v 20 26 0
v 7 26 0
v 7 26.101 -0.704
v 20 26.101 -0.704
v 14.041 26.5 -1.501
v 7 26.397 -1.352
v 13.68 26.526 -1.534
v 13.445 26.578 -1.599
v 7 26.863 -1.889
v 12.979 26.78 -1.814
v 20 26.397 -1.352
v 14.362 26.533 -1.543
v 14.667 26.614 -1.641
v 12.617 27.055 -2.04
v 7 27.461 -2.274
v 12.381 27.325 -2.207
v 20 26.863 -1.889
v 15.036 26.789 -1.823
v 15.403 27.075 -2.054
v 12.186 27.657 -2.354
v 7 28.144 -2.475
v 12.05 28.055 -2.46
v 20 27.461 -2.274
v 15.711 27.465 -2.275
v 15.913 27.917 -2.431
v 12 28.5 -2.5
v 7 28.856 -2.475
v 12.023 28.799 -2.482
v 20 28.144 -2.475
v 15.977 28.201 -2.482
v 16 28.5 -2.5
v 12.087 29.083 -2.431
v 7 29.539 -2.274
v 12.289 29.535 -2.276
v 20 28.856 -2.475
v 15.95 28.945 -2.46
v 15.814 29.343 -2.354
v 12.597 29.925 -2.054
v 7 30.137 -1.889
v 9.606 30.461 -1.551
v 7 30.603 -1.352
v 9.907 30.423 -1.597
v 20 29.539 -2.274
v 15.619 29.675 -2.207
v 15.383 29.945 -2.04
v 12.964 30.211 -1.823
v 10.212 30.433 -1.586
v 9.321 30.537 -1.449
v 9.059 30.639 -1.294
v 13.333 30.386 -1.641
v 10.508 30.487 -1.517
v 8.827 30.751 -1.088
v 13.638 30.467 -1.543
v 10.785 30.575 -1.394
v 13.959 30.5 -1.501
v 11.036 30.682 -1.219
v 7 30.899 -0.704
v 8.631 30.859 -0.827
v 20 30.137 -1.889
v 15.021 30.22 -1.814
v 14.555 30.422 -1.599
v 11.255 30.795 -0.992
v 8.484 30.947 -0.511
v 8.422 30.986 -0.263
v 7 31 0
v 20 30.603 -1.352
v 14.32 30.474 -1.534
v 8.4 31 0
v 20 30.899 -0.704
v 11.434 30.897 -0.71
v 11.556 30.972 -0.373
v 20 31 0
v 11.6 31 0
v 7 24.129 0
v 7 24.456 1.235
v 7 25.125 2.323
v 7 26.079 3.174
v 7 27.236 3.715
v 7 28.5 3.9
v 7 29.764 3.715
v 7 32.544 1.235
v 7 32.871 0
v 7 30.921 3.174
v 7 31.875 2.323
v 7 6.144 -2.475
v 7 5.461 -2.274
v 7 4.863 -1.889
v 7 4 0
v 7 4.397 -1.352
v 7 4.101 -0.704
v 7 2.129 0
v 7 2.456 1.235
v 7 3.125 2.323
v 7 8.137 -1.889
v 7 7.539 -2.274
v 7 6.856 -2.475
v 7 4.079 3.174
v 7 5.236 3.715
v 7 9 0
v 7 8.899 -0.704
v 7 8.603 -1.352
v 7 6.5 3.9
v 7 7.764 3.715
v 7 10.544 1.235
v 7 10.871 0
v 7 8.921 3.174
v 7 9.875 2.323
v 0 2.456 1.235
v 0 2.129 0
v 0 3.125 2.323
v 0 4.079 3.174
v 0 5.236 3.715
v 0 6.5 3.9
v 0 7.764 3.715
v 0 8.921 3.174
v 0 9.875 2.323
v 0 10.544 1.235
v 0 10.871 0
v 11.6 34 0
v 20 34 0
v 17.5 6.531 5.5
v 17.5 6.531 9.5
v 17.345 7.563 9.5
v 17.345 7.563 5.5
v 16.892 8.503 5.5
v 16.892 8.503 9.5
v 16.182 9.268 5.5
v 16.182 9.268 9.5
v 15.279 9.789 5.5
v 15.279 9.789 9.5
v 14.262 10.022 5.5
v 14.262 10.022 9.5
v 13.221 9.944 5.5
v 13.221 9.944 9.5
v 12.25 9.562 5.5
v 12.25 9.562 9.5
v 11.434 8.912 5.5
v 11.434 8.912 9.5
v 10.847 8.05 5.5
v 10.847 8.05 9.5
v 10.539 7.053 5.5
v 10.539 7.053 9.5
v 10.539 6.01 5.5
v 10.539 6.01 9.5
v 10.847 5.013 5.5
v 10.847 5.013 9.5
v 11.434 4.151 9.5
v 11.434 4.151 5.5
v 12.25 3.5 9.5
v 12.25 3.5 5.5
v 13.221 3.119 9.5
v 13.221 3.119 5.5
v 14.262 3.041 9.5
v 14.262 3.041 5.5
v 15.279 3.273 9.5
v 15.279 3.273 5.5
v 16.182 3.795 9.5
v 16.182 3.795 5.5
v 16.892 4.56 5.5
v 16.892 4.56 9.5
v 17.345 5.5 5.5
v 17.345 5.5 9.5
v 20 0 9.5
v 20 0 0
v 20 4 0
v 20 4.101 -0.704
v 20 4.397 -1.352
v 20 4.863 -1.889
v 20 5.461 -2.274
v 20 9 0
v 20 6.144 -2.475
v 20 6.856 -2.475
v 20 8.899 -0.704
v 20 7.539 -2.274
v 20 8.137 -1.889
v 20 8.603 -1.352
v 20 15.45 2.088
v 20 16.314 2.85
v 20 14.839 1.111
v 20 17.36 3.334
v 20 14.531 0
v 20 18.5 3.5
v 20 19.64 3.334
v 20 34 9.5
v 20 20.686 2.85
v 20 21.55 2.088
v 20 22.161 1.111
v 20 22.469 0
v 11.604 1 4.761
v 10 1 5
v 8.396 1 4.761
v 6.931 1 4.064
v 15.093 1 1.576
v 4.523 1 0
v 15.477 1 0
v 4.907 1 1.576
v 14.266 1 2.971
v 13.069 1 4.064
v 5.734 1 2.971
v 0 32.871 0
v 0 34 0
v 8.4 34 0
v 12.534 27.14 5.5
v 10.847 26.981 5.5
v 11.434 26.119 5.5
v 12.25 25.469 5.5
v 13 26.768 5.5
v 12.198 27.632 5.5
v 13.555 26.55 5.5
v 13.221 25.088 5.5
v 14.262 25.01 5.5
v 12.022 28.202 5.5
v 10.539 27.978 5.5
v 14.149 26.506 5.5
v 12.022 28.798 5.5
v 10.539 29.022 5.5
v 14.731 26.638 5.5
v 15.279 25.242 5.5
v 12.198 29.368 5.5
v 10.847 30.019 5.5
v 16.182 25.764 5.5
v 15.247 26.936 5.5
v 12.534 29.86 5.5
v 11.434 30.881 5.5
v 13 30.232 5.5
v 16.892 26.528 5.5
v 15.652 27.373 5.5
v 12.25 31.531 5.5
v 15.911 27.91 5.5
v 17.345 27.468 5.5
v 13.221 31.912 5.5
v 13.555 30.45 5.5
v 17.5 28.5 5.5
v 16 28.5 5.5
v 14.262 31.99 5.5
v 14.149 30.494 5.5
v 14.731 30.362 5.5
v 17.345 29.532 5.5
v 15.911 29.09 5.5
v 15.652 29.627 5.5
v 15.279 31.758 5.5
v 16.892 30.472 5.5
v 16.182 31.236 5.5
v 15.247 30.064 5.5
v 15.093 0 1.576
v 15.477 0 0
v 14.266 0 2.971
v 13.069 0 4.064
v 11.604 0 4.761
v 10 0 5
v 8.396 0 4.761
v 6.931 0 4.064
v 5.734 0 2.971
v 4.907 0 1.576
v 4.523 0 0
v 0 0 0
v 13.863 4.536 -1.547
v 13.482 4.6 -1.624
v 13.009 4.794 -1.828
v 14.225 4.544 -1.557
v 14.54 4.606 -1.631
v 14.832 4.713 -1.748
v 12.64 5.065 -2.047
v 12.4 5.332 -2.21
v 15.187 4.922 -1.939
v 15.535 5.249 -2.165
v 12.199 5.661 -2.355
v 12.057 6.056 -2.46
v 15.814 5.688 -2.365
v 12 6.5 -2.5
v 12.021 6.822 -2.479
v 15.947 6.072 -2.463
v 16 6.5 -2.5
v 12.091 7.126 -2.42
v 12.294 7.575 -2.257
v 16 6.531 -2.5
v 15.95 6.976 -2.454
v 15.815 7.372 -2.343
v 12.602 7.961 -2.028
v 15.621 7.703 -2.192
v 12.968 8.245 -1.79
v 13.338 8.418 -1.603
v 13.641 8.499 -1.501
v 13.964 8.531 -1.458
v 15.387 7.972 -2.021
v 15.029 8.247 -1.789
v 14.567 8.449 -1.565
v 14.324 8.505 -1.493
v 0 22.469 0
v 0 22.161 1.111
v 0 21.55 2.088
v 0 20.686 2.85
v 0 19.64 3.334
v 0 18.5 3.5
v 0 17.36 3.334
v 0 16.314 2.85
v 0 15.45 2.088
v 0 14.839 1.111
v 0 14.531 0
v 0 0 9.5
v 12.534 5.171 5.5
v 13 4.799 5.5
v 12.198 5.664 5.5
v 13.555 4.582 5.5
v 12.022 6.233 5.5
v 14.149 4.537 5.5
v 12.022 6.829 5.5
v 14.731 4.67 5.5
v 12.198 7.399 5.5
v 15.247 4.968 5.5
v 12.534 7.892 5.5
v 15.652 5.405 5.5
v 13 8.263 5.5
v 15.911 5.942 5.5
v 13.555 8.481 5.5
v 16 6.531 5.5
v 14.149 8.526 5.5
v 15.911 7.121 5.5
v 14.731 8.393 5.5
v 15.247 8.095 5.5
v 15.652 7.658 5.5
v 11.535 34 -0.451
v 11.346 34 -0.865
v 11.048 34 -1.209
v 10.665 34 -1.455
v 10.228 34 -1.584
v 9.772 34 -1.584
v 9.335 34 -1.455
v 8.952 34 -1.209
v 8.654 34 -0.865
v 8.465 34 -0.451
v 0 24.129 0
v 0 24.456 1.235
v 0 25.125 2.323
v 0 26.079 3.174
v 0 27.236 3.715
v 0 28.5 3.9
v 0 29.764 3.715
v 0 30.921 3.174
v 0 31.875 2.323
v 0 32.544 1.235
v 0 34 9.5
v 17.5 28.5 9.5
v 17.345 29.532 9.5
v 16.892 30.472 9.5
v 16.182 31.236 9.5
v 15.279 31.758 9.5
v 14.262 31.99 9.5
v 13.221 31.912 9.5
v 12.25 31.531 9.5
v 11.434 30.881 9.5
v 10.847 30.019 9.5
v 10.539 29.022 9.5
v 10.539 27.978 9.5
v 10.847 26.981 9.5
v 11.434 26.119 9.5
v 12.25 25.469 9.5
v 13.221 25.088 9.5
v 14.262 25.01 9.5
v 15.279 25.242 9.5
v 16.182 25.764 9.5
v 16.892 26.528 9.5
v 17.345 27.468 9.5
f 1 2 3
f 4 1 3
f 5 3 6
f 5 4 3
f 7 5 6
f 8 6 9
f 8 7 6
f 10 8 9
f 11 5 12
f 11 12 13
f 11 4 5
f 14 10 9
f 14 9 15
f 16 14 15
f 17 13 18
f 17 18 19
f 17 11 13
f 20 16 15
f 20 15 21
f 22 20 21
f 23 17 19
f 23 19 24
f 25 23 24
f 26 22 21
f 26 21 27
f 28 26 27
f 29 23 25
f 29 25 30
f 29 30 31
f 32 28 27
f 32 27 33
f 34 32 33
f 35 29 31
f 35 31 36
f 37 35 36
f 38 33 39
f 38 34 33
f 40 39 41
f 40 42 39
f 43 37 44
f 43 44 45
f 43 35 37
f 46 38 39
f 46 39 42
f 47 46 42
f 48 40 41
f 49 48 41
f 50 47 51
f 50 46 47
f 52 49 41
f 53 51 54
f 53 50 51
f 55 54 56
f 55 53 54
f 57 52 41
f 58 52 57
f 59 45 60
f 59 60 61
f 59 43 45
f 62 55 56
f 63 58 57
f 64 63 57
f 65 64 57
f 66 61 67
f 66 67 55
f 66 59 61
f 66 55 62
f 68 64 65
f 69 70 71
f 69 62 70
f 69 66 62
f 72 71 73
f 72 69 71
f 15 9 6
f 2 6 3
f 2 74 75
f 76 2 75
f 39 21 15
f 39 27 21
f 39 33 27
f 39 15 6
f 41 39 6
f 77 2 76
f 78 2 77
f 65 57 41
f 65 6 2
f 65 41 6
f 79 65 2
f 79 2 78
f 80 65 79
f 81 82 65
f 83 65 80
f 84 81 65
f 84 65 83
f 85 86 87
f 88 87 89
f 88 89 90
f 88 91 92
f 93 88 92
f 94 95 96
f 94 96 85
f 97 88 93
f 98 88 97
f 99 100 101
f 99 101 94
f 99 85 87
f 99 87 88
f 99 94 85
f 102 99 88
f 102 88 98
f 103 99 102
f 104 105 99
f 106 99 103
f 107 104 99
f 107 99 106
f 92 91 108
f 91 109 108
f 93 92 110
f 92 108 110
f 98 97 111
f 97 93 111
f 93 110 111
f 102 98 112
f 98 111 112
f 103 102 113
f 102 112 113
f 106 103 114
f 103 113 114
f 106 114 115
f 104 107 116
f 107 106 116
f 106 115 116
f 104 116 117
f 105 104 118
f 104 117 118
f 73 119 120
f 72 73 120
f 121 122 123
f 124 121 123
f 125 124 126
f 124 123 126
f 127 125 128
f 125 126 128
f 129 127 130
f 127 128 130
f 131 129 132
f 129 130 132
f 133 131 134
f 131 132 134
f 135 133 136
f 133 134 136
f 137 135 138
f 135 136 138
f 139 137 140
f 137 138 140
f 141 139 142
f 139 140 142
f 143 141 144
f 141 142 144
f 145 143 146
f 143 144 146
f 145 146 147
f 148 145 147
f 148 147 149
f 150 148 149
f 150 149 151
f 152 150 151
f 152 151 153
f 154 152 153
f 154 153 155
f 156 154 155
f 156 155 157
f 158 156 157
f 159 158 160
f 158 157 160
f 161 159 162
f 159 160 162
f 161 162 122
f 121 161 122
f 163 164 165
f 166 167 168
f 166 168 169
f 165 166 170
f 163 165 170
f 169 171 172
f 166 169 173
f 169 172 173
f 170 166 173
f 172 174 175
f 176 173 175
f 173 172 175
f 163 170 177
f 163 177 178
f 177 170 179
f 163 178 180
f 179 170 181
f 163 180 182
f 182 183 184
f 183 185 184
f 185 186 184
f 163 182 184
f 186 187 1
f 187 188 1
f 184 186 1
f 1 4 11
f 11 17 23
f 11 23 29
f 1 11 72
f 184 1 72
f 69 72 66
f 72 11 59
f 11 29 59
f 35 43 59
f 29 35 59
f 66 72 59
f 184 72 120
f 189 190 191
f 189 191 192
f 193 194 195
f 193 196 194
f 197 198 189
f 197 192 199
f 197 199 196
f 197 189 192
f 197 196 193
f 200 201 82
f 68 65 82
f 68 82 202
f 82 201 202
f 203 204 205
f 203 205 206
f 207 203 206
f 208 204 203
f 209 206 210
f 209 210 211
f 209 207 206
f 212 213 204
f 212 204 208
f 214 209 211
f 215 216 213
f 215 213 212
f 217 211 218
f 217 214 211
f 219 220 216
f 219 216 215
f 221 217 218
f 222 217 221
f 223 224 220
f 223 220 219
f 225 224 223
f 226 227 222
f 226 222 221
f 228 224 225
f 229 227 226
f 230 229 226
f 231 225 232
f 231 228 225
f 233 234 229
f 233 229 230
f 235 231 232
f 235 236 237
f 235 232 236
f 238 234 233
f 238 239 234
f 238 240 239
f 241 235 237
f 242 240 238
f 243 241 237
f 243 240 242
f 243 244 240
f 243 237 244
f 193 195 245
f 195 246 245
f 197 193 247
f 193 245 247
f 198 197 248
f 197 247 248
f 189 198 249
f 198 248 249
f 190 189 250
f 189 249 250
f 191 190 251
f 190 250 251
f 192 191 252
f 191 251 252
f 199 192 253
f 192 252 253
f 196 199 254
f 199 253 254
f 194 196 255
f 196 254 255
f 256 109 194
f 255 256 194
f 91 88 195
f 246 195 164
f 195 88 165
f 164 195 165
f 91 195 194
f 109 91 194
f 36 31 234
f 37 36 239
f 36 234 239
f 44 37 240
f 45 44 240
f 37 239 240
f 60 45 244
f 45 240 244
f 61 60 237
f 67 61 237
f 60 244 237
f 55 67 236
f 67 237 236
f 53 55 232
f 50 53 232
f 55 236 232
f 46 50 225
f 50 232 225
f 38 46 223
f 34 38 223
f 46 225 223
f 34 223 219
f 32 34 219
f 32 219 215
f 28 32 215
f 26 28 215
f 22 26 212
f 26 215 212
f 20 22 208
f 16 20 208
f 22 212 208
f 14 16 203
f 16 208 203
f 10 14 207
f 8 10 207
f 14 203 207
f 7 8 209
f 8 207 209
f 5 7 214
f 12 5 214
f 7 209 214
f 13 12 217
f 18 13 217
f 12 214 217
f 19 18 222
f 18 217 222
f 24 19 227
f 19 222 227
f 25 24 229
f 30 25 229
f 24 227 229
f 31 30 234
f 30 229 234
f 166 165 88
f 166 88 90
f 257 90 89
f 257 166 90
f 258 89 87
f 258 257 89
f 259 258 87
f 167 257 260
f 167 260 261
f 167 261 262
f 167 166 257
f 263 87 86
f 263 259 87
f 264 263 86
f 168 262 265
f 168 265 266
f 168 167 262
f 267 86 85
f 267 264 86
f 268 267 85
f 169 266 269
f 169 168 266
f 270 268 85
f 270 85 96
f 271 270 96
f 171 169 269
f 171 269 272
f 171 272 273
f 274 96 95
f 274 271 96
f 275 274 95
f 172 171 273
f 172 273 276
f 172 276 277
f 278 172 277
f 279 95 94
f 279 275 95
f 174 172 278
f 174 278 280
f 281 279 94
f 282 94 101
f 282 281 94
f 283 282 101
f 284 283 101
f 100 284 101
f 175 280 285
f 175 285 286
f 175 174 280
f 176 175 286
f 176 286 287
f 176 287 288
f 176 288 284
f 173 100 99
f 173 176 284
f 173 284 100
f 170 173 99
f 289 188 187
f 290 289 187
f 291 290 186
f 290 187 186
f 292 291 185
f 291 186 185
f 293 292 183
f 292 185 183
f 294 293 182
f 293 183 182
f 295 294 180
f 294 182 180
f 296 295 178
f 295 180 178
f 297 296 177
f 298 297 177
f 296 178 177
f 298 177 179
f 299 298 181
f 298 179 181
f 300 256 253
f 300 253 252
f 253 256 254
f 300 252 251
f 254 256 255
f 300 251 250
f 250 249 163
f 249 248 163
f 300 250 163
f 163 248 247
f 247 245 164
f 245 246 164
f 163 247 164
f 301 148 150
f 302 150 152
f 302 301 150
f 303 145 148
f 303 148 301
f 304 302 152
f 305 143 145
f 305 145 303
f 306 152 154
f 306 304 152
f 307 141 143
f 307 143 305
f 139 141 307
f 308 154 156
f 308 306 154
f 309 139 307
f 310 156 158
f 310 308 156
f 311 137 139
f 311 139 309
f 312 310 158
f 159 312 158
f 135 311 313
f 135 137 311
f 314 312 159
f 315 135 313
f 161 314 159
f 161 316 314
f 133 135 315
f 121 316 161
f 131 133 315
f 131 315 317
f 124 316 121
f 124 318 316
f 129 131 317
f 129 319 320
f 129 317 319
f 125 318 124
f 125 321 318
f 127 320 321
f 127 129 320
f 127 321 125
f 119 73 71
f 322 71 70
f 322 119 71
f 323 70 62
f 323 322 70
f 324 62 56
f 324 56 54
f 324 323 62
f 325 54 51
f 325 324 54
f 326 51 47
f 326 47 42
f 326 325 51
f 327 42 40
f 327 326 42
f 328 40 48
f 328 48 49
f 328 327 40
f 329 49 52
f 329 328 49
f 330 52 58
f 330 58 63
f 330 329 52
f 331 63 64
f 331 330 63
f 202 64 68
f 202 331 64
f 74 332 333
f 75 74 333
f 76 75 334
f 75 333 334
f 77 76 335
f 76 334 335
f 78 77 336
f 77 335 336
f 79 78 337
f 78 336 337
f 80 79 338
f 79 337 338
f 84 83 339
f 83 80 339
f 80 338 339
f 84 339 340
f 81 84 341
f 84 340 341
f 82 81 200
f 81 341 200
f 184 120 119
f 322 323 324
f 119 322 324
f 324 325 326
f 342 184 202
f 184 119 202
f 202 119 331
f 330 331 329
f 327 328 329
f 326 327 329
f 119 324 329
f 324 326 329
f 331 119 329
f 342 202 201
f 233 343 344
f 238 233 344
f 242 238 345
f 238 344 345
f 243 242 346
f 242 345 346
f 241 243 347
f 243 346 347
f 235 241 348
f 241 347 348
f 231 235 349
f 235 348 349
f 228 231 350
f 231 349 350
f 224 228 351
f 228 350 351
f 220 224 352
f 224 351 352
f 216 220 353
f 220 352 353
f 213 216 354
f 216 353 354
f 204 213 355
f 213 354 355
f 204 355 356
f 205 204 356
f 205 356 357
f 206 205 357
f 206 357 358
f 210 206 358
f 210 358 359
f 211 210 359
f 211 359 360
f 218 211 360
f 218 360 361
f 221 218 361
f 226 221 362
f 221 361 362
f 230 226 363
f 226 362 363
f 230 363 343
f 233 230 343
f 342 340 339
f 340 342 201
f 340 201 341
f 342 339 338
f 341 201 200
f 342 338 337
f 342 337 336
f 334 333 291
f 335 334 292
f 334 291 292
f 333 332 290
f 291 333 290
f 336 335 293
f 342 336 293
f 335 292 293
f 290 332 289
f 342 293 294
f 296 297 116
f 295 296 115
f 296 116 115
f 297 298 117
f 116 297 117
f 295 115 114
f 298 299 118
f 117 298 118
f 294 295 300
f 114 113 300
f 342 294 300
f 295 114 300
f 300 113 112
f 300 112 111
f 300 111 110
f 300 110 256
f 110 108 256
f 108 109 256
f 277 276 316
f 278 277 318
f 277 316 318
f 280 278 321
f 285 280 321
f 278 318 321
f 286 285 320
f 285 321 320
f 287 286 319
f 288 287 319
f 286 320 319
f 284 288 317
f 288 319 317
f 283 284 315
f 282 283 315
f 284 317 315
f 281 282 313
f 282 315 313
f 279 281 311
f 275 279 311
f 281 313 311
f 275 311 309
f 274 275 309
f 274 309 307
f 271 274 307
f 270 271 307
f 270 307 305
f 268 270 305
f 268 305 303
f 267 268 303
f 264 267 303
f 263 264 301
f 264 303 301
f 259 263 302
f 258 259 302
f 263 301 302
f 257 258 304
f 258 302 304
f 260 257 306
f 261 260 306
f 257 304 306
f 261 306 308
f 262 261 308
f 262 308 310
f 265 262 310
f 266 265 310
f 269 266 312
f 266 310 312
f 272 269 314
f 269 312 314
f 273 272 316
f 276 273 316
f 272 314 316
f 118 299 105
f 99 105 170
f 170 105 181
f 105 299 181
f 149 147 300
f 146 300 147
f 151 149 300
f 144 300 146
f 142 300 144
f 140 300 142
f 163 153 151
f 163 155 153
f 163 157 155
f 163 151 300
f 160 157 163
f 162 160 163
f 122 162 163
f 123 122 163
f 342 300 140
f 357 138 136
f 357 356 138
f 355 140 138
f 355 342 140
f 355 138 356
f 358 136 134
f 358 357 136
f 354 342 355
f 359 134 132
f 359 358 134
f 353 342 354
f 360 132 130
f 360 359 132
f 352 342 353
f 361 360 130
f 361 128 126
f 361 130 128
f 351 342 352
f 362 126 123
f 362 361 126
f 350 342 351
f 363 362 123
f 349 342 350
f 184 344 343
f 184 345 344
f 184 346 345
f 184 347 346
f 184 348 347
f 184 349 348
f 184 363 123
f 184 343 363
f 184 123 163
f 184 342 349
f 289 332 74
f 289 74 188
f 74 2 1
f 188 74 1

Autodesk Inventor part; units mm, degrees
ref_plane "YZ Plane" through (0, 0, 0) normal (1, 0, 0) x (0, 1, 0)
ref_plane "XZ Plane" through (0, 0, 0) normal (0, 1, 0) x (-1, 0, 0)
ref_plane "XY Plane" through (0, 0, 0) normal (0, 0, 1) x (1, 0, 0)
sketch "Sketch1" plane through (0, 0, 0) normal (0, 0, 1) x (1, 0, 0)
  line L0 (0, 0) -> (20, 0)
  line L1 (20, 0) -> (20, 34)
  line L2 (20, 34) -> (0, 34)
  line L3 (0, 34) -> (0, 0)
  dimension "d0" = 20
  dimension "d1" = 34
extrude "Extrusion1" add sketch "Sketch1" along normal blind 9.5
sketch "Sketch2" plane through (20, 0, 0) normal (1, 0, 0) x (0, 0, -1)
  line L0 (0, 0) -> (0, 34) projected
  circle A0 centre (0.5, 18.5) radius 4
  dimension "d4" = 8
  dimension "d11" = 0.5
  dimension "d26" = 18.5
extrude "Extrusion2" cut sketch "Sketch2" against normal up to next
sketch "Sketch3" plane through (0, 0, 9.5) normal (-1, 0, 0) x (0, 0, 1)
  line L0 (-9.5, 14.5314) -> (-9.5, 0) projected
  line L1 (-9.5, 34) -> (-9.5, 22.4686) projected
  circle A0 centre (-10, 6.5) radius 4.4
  circle A1 centre (-10, 28.5) radius 4.4
  arc A2 (-9.5, 14.5314) -> (-9.5, 22.4686) centre (-10, 18.5) ccw projected
  dimension "d7" = 8.8
  dimension "d8" = 8.8
  dimension "d9" = 0.5
  dimension "d10" = 0.5
  dimension "d64" = 10
  dimension "d65" = 12
extrude "Extrusion3" cut sketch "Sketch3" against normal blind 7
sketch "Sketch7" plane through (20, 0, 9.5) normal (1, 0, 0) x (0, 0, -1)
  line L0 (9.5, 22.4686) -> (9.5, 34) projected
  circle A0 centre (9.5, 28.5) radius 2.5
  line L1 (9.5, 2.1285) -> (9.5, 14.5314) projected
  circle A1 centre (9.5, 6.5) radius 2.5
  arc A2 (9.5, 22.4686) -> (9.5, 14.5314) centre (10, 18.5) ccw projected
  dimension "d33" = 5
  dimension "d34" = 5
  dimension "d61" = 10
  dimension "d62" = 12
extrude "Extrusion7" add sketch "Sketch7" against normal up to surface (13 mm away)
sketch "Sketch8" plane through (0, 0, 9.5) normal (0, 0, 1) x (1, 0, 0)
  line L0 (20, 34) -> (0, 34) projected
  line L1 (0, 34) -> (0, 0) projected
  circle A0 centre (14, 28.5) radius 2
  circle A1 centre (14, 6.5314) radius 2
  line L2 (20, 22.4686) -> (20, 14.5314) projected
  line L3 (20, 22.4686) -> (0, 22.4686) projected
  line L4 (20, 14.5314) -> (20, 22.4686) projected
  line L5 (0, 14.5314) -> (20, 14.5314) projected
  line L6 (0, 22.4686) -> (0, 14.5314) projected
  dimension "d39" = 4
  dimension "d40" = 4
  dimension "d42" = 5.5
  dimension "d43" = 14
  dimension "d66" = 8
extrude "Extrusion8" cut sketch "Sketch8" against normal up to next contours A0 | A1
sketch "Sketch9" plane through (0, 34, 0) normal (0, 1, 0) x (1, 0, 0)
  line L0 (20, 0) -> (0, 0) projected
  line L1 (20, 0) -> (20, -9.5) projected
  circle A0 centre (10, 0) radius 1.6
  dimension "d48" = 3.2
  dimension "d49" = 10
extrude "Extrusion9" add sketch "Sketch9" against normal blind 6
sketch "Sketch10" plane through (0, 0, 9.5) normal (0, 0, 1) x (1, 0, 0)
  circle A0 centre (14, 28.5) radius 2 projected
  circle A1 centre (14, 6.5314) radius 2 projected
  circle A2 centre (14, 28.5) radius 3.5
  circle A3 centre (14, 6.5314) radius 3.5
  dimension "d52" = 7
  dimension "d53" = 7
extrude "Extrusion10" cut sketch "Sketch10" against normal blind 4
sketch "Sketch11" plane through (0, 0, 0) normal (0, -1, 0) x (1, 0, 0)
  line L0 (0, 0) -> (20, 0) projected
  line L1 (0, 0) -> (0, 9.5) projected
  circle A0 centre (10, -0.5) radius 5.5
  dimension "d56" = 11
  dimension "d57" = 10
  dimension "d58" = 0.5
extrude "Extrusion11" cut sketch "Sketch11" against normal blind 1
properties part number "YAxisIdlerCap" material "ABS Plastic"
